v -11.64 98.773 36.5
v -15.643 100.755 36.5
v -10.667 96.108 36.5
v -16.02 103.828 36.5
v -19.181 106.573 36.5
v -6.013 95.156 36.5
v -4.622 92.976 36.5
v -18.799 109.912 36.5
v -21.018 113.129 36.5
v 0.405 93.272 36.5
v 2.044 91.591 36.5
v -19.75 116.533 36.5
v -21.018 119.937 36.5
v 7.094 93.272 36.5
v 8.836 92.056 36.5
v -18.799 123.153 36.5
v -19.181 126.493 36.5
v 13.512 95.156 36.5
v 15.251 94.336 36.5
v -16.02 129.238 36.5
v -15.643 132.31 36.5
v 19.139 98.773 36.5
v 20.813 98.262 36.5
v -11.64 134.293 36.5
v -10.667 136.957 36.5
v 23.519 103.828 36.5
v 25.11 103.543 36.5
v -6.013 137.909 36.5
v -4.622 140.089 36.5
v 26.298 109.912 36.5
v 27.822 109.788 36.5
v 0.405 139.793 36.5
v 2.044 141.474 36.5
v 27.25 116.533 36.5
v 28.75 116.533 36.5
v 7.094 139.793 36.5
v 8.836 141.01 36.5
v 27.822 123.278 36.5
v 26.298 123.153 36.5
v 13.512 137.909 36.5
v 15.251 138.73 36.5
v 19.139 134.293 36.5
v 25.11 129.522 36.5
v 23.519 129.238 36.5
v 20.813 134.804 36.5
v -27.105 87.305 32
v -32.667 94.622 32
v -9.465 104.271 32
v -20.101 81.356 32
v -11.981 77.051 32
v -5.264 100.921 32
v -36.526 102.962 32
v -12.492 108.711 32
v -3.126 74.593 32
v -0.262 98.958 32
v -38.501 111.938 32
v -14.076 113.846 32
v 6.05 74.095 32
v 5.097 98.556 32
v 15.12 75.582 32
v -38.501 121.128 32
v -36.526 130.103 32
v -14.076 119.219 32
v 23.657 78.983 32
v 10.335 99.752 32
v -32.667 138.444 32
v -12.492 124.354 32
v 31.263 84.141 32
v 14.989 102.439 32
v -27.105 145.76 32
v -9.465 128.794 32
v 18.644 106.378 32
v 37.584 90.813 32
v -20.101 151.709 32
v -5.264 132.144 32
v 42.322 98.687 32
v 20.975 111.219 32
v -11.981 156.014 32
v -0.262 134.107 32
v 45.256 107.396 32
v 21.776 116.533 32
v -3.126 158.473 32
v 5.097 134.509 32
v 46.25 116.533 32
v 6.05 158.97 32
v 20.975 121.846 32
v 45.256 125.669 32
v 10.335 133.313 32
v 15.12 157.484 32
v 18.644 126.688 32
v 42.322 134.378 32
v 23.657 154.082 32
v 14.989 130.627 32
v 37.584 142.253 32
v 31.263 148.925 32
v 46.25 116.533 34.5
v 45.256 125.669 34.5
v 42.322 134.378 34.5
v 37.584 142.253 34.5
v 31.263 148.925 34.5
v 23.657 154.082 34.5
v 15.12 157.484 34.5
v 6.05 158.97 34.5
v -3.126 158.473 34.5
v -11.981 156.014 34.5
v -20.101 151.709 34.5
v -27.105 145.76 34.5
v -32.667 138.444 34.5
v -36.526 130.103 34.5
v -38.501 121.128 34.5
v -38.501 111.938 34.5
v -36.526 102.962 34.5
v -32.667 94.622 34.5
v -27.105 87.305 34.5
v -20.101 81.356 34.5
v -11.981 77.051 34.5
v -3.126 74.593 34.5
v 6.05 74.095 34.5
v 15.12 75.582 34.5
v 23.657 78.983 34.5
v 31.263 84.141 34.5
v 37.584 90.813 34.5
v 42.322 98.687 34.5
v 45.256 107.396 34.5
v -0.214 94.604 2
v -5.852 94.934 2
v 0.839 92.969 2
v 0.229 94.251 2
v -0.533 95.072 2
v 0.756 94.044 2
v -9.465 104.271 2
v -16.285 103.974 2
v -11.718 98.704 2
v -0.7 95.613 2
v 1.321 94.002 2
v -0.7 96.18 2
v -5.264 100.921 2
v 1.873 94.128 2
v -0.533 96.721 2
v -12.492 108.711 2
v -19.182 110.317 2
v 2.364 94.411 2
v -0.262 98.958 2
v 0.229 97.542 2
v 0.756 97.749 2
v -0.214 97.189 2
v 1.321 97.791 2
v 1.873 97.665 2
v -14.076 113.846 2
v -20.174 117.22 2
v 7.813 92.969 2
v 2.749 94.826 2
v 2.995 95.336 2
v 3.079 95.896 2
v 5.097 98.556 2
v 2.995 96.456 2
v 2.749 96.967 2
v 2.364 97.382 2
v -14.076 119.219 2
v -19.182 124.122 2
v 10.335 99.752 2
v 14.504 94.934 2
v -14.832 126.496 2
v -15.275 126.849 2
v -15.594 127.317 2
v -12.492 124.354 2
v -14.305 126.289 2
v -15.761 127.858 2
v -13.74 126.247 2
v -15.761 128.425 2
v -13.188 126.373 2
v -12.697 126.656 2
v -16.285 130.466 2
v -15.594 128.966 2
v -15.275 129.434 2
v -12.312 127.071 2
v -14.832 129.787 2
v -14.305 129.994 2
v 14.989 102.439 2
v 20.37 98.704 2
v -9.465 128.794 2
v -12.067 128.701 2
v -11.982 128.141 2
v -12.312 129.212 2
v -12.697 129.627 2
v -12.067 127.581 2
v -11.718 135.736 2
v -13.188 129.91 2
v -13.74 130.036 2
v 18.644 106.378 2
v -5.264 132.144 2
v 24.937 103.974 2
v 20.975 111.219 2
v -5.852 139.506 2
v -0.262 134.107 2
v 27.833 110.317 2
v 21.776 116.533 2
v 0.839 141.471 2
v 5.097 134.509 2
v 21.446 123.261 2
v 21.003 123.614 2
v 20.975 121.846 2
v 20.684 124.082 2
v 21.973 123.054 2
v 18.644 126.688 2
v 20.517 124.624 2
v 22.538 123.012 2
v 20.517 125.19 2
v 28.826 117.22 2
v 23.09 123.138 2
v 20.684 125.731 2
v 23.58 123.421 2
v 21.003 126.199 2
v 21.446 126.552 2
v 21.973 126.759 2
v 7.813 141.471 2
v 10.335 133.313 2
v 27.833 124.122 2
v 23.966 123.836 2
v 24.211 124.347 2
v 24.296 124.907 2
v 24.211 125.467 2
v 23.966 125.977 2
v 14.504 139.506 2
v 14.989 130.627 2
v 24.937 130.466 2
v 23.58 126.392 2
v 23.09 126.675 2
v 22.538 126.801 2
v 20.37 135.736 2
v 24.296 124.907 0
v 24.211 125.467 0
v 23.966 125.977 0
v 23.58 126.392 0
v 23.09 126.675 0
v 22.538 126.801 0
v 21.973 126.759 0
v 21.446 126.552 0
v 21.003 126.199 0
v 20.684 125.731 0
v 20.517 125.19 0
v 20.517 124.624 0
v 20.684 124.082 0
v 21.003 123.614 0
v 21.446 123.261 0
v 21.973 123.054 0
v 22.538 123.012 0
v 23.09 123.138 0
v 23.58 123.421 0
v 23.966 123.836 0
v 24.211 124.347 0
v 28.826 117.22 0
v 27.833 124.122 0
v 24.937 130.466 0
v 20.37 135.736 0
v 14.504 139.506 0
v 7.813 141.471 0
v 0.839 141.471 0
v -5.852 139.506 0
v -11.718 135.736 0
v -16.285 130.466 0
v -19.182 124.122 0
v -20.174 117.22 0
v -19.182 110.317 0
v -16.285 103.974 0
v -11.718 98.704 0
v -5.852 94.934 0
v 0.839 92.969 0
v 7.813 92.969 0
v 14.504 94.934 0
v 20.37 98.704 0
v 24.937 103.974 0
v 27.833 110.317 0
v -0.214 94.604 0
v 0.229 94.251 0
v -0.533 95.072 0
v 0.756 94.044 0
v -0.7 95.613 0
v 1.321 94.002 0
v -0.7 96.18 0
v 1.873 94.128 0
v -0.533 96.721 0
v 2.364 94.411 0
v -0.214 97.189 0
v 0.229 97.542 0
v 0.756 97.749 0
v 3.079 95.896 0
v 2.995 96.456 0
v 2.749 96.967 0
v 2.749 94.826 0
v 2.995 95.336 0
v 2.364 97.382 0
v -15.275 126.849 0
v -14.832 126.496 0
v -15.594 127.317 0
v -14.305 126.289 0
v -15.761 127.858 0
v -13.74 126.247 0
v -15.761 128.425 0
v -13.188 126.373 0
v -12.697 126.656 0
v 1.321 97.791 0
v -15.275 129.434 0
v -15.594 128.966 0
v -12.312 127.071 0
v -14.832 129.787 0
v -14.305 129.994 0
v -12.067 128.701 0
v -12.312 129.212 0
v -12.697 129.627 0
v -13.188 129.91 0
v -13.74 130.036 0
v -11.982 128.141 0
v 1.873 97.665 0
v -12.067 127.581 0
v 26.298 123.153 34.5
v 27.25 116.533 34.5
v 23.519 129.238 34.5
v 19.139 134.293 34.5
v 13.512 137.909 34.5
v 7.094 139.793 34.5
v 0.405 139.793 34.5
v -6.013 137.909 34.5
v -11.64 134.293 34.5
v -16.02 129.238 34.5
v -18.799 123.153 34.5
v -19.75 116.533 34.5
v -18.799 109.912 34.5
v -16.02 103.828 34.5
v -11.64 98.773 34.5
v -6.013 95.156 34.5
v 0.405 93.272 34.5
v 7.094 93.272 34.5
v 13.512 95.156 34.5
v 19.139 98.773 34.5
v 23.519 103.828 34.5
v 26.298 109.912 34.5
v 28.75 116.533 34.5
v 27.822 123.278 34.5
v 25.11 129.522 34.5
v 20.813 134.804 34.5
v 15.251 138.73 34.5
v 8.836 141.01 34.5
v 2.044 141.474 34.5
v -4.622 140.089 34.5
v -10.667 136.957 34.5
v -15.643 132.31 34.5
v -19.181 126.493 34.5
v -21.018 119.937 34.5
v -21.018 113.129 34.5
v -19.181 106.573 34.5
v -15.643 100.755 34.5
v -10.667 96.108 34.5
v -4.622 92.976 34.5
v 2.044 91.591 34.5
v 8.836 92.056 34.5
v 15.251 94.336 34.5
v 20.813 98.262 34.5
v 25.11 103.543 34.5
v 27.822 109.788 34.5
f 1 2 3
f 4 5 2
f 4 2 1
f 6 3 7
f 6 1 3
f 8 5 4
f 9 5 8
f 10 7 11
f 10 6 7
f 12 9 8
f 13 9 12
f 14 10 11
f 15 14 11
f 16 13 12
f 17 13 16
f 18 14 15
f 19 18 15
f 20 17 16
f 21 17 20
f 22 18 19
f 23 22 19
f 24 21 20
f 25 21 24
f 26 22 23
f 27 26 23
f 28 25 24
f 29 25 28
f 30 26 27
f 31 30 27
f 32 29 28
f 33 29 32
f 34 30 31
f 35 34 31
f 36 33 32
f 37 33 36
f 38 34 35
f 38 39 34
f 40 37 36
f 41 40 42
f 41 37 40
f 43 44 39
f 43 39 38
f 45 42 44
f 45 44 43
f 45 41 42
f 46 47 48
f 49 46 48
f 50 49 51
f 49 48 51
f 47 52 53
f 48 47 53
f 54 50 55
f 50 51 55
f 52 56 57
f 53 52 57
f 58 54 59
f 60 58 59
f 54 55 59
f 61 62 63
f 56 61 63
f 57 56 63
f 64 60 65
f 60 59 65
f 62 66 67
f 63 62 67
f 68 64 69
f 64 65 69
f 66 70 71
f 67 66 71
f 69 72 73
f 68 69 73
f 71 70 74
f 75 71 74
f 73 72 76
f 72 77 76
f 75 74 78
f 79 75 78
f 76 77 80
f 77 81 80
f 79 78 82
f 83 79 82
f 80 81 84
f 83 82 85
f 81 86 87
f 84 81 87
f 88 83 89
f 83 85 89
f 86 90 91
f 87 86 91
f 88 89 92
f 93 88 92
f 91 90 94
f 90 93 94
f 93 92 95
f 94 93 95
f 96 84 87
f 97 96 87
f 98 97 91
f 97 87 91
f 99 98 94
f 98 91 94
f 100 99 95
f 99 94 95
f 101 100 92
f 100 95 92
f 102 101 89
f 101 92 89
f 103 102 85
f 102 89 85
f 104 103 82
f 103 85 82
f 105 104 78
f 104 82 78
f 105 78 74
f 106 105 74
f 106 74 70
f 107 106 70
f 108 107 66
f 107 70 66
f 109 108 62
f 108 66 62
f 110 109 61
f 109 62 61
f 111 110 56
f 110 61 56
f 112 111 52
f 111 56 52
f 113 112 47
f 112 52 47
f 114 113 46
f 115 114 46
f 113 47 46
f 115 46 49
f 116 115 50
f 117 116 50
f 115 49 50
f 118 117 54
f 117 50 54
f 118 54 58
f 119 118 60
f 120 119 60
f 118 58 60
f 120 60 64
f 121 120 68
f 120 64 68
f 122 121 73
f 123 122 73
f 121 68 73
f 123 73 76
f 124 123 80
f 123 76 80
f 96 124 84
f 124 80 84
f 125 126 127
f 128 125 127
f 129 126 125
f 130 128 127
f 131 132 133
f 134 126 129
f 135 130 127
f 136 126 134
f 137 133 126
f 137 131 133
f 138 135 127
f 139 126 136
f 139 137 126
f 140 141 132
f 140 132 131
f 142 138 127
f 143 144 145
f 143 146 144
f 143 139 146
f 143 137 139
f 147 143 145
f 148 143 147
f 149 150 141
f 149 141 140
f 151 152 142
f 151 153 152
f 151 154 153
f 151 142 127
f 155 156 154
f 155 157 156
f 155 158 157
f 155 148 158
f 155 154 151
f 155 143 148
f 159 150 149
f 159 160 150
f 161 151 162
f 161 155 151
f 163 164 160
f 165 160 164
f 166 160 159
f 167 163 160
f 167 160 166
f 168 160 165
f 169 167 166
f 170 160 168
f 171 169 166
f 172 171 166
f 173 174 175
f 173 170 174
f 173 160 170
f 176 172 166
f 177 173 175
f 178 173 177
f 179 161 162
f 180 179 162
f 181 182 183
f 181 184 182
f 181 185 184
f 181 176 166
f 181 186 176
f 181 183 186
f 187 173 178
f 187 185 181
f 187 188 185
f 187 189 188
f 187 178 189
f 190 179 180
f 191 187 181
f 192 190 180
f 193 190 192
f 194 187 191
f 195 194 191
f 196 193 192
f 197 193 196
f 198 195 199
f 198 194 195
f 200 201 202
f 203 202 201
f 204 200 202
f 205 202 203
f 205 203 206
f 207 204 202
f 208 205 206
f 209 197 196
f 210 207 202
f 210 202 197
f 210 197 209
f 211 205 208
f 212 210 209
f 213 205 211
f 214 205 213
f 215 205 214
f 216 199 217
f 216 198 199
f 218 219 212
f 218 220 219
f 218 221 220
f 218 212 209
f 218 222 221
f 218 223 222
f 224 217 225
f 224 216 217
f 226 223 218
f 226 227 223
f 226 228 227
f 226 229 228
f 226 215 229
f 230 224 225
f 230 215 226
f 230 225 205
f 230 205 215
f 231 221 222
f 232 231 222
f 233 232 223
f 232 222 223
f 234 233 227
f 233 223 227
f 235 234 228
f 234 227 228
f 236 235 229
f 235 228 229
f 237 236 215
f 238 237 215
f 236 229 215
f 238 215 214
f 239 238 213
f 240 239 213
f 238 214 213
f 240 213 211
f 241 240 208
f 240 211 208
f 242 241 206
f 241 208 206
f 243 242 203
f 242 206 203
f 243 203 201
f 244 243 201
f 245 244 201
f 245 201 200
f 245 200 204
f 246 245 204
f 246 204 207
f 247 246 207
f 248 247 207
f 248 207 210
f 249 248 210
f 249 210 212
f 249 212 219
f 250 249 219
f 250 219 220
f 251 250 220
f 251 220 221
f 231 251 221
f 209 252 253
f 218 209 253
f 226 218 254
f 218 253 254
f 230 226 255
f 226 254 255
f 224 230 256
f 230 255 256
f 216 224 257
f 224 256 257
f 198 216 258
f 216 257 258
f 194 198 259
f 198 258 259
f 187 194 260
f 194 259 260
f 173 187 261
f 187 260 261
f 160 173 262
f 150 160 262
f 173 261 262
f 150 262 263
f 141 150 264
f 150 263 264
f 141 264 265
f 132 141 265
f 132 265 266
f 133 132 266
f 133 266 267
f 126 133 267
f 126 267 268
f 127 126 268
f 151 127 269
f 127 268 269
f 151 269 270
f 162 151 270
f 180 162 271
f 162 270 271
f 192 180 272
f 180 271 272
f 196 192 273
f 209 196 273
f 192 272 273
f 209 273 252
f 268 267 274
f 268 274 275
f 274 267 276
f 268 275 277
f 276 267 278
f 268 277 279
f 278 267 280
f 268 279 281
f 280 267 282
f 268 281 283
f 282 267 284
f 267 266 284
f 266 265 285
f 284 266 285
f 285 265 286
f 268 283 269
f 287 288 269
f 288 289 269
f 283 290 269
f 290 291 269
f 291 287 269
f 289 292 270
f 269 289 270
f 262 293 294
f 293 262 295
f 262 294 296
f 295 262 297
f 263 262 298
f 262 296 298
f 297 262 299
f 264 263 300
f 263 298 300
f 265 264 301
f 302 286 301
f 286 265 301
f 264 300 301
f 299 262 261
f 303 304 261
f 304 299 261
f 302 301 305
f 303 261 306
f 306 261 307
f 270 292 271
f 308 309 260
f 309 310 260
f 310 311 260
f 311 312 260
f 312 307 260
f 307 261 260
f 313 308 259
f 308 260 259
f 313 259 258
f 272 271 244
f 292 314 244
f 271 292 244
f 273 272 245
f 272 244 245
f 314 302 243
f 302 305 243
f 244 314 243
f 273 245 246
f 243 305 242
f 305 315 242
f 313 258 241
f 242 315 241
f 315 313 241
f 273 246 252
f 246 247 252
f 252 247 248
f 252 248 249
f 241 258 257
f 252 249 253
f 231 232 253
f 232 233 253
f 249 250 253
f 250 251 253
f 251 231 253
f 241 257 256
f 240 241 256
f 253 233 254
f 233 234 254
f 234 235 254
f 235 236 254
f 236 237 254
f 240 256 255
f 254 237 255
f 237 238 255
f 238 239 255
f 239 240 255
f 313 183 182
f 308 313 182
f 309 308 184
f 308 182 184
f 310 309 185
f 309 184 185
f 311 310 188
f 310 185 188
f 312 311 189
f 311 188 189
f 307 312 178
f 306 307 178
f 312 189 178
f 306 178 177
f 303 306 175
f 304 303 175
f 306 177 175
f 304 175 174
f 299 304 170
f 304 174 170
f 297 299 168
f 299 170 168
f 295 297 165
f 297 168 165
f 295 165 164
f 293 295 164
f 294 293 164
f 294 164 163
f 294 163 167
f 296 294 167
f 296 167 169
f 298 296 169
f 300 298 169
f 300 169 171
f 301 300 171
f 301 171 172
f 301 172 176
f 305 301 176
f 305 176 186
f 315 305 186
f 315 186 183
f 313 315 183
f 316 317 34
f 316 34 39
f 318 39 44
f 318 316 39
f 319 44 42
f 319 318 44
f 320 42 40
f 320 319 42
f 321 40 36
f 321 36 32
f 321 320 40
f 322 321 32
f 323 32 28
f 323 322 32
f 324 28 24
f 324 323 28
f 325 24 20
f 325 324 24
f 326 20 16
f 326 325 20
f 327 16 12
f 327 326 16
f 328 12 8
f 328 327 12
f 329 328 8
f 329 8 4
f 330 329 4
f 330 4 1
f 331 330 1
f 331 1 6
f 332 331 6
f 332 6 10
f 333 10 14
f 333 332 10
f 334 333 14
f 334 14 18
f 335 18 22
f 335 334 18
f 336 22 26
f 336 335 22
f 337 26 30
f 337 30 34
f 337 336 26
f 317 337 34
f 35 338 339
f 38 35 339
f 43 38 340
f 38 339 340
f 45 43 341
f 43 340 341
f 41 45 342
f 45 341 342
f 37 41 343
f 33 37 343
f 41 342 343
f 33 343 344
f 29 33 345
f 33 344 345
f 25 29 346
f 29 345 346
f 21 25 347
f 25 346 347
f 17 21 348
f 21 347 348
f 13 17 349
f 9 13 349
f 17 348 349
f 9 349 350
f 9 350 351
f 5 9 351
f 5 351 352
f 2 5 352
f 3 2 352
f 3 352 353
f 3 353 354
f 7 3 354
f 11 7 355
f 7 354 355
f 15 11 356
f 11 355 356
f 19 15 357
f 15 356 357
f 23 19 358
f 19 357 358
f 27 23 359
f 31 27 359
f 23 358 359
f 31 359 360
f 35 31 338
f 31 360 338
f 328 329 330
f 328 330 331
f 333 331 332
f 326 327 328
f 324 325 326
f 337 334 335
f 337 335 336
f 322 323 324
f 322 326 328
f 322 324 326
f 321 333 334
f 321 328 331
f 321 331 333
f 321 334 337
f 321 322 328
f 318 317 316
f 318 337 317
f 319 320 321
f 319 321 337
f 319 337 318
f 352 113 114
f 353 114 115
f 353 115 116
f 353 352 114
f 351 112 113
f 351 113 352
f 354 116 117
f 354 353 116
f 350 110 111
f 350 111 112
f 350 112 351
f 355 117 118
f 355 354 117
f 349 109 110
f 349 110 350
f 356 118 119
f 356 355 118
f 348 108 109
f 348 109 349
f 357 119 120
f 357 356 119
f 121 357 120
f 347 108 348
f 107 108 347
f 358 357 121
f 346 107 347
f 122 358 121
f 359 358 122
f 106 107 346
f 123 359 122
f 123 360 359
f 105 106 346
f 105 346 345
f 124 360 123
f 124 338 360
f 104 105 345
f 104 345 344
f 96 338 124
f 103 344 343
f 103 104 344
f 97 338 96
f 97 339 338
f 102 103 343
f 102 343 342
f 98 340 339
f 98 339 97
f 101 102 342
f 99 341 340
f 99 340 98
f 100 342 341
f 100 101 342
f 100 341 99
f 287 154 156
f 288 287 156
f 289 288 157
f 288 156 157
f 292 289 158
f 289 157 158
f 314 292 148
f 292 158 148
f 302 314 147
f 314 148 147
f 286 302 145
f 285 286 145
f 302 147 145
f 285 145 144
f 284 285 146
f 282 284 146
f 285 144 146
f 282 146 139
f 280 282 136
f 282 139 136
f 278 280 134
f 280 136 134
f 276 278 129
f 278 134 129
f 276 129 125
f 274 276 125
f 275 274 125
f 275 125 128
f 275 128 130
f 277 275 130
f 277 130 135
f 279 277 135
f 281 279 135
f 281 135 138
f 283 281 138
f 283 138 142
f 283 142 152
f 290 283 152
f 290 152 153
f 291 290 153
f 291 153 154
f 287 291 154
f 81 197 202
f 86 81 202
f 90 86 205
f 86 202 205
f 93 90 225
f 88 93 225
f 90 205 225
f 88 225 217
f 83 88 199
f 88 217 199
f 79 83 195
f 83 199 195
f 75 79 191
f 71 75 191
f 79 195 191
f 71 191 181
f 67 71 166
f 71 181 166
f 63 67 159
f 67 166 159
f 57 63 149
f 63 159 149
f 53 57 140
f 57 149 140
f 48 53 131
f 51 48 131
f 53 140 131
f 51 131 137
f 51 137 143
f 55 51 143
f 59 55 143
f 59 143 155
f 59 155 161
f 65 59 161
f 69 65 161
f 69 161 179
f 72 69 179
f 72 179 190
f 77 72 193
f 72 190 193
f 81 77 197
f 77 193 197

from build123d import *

# Parameters (mm, degrees)
SKETCH_1_R          = 24.5
EXTRUDE_3_DEPTH     = 2
SKETCH_3_R          = 1.9
CUT_EXTRUDE_1_DEPTH = 3
SKETCH_4_R          = 18.026762753
EXTRUDE_4_DEPTH     = 30
SKETCH_5_R          = 42.5
EXTRUDE_6_DEPTH     = 2.5
SKETCH_6_R          = 25
SKETCH_6_R_2        = 23.5
EXTRUDE_7_DEPTH     = 2


with BuildPart() as part:
    # 스케치1 → 보스-돌출3 (new body)
    with BuildSketch(Plane.XY):
        with Locations((4.325882057, 117.219920175)):
            Circle(SKETCH_1_R)
    extrude(amount=EXTRUDE_3_DEPTH)

    # 스케치3 → 컷-돌출1 (cut)
    with BuildSketch(Plane.XY.offset(2)):
        with Locations((1.179008368, 95.896439246)):
            Circle(SKETCH_3_R)
        with Locations((22.395703109, 124.906718796)):
            Circle(SKETCH_3_R)
        with Locations((-13.882118572, 128.141421182)):
            Circle(SKETCH_3_R)
    extrude(amount=-CUT_EXTRUDE_1_DEPTH, mode=Mode.SUBTRACT)

    # 스케치4 → 보스-돌출4 (add)
    with BuildSketch(Plane.XY.offset(2)):
        with Locations((3.749565529, 116.53268792)):
            Circle(SKETCH_4_R)
    extrude(amount=EXTRUDE_4_DEPTH)

    # 스케치5 → 보스-돌출6 (add)
    with BuildSketch(Plane.XY.offset(32)):
        with Locations((3.749565529, 116.53268792)):
            Circle(SKETCH_5_R)
    extrude(amount=EXTRUDE_6_DEPTH)

    # 스케치6 → 보스-돌출7 (add)
    with BuildSketch(Plane.XY.offset(34.5)):
        with Locations((3.749565529, 116.53268792)):
            Circle(SKETCH_6_R)
        with Locations((3.749565529, 116.53268792)):
            Circle(SKETCH_6_R_2, mode=Mode.SUBTRACT)
    extrude(amount=EXTRUDE_7_DEPTH)


solid = part.part
